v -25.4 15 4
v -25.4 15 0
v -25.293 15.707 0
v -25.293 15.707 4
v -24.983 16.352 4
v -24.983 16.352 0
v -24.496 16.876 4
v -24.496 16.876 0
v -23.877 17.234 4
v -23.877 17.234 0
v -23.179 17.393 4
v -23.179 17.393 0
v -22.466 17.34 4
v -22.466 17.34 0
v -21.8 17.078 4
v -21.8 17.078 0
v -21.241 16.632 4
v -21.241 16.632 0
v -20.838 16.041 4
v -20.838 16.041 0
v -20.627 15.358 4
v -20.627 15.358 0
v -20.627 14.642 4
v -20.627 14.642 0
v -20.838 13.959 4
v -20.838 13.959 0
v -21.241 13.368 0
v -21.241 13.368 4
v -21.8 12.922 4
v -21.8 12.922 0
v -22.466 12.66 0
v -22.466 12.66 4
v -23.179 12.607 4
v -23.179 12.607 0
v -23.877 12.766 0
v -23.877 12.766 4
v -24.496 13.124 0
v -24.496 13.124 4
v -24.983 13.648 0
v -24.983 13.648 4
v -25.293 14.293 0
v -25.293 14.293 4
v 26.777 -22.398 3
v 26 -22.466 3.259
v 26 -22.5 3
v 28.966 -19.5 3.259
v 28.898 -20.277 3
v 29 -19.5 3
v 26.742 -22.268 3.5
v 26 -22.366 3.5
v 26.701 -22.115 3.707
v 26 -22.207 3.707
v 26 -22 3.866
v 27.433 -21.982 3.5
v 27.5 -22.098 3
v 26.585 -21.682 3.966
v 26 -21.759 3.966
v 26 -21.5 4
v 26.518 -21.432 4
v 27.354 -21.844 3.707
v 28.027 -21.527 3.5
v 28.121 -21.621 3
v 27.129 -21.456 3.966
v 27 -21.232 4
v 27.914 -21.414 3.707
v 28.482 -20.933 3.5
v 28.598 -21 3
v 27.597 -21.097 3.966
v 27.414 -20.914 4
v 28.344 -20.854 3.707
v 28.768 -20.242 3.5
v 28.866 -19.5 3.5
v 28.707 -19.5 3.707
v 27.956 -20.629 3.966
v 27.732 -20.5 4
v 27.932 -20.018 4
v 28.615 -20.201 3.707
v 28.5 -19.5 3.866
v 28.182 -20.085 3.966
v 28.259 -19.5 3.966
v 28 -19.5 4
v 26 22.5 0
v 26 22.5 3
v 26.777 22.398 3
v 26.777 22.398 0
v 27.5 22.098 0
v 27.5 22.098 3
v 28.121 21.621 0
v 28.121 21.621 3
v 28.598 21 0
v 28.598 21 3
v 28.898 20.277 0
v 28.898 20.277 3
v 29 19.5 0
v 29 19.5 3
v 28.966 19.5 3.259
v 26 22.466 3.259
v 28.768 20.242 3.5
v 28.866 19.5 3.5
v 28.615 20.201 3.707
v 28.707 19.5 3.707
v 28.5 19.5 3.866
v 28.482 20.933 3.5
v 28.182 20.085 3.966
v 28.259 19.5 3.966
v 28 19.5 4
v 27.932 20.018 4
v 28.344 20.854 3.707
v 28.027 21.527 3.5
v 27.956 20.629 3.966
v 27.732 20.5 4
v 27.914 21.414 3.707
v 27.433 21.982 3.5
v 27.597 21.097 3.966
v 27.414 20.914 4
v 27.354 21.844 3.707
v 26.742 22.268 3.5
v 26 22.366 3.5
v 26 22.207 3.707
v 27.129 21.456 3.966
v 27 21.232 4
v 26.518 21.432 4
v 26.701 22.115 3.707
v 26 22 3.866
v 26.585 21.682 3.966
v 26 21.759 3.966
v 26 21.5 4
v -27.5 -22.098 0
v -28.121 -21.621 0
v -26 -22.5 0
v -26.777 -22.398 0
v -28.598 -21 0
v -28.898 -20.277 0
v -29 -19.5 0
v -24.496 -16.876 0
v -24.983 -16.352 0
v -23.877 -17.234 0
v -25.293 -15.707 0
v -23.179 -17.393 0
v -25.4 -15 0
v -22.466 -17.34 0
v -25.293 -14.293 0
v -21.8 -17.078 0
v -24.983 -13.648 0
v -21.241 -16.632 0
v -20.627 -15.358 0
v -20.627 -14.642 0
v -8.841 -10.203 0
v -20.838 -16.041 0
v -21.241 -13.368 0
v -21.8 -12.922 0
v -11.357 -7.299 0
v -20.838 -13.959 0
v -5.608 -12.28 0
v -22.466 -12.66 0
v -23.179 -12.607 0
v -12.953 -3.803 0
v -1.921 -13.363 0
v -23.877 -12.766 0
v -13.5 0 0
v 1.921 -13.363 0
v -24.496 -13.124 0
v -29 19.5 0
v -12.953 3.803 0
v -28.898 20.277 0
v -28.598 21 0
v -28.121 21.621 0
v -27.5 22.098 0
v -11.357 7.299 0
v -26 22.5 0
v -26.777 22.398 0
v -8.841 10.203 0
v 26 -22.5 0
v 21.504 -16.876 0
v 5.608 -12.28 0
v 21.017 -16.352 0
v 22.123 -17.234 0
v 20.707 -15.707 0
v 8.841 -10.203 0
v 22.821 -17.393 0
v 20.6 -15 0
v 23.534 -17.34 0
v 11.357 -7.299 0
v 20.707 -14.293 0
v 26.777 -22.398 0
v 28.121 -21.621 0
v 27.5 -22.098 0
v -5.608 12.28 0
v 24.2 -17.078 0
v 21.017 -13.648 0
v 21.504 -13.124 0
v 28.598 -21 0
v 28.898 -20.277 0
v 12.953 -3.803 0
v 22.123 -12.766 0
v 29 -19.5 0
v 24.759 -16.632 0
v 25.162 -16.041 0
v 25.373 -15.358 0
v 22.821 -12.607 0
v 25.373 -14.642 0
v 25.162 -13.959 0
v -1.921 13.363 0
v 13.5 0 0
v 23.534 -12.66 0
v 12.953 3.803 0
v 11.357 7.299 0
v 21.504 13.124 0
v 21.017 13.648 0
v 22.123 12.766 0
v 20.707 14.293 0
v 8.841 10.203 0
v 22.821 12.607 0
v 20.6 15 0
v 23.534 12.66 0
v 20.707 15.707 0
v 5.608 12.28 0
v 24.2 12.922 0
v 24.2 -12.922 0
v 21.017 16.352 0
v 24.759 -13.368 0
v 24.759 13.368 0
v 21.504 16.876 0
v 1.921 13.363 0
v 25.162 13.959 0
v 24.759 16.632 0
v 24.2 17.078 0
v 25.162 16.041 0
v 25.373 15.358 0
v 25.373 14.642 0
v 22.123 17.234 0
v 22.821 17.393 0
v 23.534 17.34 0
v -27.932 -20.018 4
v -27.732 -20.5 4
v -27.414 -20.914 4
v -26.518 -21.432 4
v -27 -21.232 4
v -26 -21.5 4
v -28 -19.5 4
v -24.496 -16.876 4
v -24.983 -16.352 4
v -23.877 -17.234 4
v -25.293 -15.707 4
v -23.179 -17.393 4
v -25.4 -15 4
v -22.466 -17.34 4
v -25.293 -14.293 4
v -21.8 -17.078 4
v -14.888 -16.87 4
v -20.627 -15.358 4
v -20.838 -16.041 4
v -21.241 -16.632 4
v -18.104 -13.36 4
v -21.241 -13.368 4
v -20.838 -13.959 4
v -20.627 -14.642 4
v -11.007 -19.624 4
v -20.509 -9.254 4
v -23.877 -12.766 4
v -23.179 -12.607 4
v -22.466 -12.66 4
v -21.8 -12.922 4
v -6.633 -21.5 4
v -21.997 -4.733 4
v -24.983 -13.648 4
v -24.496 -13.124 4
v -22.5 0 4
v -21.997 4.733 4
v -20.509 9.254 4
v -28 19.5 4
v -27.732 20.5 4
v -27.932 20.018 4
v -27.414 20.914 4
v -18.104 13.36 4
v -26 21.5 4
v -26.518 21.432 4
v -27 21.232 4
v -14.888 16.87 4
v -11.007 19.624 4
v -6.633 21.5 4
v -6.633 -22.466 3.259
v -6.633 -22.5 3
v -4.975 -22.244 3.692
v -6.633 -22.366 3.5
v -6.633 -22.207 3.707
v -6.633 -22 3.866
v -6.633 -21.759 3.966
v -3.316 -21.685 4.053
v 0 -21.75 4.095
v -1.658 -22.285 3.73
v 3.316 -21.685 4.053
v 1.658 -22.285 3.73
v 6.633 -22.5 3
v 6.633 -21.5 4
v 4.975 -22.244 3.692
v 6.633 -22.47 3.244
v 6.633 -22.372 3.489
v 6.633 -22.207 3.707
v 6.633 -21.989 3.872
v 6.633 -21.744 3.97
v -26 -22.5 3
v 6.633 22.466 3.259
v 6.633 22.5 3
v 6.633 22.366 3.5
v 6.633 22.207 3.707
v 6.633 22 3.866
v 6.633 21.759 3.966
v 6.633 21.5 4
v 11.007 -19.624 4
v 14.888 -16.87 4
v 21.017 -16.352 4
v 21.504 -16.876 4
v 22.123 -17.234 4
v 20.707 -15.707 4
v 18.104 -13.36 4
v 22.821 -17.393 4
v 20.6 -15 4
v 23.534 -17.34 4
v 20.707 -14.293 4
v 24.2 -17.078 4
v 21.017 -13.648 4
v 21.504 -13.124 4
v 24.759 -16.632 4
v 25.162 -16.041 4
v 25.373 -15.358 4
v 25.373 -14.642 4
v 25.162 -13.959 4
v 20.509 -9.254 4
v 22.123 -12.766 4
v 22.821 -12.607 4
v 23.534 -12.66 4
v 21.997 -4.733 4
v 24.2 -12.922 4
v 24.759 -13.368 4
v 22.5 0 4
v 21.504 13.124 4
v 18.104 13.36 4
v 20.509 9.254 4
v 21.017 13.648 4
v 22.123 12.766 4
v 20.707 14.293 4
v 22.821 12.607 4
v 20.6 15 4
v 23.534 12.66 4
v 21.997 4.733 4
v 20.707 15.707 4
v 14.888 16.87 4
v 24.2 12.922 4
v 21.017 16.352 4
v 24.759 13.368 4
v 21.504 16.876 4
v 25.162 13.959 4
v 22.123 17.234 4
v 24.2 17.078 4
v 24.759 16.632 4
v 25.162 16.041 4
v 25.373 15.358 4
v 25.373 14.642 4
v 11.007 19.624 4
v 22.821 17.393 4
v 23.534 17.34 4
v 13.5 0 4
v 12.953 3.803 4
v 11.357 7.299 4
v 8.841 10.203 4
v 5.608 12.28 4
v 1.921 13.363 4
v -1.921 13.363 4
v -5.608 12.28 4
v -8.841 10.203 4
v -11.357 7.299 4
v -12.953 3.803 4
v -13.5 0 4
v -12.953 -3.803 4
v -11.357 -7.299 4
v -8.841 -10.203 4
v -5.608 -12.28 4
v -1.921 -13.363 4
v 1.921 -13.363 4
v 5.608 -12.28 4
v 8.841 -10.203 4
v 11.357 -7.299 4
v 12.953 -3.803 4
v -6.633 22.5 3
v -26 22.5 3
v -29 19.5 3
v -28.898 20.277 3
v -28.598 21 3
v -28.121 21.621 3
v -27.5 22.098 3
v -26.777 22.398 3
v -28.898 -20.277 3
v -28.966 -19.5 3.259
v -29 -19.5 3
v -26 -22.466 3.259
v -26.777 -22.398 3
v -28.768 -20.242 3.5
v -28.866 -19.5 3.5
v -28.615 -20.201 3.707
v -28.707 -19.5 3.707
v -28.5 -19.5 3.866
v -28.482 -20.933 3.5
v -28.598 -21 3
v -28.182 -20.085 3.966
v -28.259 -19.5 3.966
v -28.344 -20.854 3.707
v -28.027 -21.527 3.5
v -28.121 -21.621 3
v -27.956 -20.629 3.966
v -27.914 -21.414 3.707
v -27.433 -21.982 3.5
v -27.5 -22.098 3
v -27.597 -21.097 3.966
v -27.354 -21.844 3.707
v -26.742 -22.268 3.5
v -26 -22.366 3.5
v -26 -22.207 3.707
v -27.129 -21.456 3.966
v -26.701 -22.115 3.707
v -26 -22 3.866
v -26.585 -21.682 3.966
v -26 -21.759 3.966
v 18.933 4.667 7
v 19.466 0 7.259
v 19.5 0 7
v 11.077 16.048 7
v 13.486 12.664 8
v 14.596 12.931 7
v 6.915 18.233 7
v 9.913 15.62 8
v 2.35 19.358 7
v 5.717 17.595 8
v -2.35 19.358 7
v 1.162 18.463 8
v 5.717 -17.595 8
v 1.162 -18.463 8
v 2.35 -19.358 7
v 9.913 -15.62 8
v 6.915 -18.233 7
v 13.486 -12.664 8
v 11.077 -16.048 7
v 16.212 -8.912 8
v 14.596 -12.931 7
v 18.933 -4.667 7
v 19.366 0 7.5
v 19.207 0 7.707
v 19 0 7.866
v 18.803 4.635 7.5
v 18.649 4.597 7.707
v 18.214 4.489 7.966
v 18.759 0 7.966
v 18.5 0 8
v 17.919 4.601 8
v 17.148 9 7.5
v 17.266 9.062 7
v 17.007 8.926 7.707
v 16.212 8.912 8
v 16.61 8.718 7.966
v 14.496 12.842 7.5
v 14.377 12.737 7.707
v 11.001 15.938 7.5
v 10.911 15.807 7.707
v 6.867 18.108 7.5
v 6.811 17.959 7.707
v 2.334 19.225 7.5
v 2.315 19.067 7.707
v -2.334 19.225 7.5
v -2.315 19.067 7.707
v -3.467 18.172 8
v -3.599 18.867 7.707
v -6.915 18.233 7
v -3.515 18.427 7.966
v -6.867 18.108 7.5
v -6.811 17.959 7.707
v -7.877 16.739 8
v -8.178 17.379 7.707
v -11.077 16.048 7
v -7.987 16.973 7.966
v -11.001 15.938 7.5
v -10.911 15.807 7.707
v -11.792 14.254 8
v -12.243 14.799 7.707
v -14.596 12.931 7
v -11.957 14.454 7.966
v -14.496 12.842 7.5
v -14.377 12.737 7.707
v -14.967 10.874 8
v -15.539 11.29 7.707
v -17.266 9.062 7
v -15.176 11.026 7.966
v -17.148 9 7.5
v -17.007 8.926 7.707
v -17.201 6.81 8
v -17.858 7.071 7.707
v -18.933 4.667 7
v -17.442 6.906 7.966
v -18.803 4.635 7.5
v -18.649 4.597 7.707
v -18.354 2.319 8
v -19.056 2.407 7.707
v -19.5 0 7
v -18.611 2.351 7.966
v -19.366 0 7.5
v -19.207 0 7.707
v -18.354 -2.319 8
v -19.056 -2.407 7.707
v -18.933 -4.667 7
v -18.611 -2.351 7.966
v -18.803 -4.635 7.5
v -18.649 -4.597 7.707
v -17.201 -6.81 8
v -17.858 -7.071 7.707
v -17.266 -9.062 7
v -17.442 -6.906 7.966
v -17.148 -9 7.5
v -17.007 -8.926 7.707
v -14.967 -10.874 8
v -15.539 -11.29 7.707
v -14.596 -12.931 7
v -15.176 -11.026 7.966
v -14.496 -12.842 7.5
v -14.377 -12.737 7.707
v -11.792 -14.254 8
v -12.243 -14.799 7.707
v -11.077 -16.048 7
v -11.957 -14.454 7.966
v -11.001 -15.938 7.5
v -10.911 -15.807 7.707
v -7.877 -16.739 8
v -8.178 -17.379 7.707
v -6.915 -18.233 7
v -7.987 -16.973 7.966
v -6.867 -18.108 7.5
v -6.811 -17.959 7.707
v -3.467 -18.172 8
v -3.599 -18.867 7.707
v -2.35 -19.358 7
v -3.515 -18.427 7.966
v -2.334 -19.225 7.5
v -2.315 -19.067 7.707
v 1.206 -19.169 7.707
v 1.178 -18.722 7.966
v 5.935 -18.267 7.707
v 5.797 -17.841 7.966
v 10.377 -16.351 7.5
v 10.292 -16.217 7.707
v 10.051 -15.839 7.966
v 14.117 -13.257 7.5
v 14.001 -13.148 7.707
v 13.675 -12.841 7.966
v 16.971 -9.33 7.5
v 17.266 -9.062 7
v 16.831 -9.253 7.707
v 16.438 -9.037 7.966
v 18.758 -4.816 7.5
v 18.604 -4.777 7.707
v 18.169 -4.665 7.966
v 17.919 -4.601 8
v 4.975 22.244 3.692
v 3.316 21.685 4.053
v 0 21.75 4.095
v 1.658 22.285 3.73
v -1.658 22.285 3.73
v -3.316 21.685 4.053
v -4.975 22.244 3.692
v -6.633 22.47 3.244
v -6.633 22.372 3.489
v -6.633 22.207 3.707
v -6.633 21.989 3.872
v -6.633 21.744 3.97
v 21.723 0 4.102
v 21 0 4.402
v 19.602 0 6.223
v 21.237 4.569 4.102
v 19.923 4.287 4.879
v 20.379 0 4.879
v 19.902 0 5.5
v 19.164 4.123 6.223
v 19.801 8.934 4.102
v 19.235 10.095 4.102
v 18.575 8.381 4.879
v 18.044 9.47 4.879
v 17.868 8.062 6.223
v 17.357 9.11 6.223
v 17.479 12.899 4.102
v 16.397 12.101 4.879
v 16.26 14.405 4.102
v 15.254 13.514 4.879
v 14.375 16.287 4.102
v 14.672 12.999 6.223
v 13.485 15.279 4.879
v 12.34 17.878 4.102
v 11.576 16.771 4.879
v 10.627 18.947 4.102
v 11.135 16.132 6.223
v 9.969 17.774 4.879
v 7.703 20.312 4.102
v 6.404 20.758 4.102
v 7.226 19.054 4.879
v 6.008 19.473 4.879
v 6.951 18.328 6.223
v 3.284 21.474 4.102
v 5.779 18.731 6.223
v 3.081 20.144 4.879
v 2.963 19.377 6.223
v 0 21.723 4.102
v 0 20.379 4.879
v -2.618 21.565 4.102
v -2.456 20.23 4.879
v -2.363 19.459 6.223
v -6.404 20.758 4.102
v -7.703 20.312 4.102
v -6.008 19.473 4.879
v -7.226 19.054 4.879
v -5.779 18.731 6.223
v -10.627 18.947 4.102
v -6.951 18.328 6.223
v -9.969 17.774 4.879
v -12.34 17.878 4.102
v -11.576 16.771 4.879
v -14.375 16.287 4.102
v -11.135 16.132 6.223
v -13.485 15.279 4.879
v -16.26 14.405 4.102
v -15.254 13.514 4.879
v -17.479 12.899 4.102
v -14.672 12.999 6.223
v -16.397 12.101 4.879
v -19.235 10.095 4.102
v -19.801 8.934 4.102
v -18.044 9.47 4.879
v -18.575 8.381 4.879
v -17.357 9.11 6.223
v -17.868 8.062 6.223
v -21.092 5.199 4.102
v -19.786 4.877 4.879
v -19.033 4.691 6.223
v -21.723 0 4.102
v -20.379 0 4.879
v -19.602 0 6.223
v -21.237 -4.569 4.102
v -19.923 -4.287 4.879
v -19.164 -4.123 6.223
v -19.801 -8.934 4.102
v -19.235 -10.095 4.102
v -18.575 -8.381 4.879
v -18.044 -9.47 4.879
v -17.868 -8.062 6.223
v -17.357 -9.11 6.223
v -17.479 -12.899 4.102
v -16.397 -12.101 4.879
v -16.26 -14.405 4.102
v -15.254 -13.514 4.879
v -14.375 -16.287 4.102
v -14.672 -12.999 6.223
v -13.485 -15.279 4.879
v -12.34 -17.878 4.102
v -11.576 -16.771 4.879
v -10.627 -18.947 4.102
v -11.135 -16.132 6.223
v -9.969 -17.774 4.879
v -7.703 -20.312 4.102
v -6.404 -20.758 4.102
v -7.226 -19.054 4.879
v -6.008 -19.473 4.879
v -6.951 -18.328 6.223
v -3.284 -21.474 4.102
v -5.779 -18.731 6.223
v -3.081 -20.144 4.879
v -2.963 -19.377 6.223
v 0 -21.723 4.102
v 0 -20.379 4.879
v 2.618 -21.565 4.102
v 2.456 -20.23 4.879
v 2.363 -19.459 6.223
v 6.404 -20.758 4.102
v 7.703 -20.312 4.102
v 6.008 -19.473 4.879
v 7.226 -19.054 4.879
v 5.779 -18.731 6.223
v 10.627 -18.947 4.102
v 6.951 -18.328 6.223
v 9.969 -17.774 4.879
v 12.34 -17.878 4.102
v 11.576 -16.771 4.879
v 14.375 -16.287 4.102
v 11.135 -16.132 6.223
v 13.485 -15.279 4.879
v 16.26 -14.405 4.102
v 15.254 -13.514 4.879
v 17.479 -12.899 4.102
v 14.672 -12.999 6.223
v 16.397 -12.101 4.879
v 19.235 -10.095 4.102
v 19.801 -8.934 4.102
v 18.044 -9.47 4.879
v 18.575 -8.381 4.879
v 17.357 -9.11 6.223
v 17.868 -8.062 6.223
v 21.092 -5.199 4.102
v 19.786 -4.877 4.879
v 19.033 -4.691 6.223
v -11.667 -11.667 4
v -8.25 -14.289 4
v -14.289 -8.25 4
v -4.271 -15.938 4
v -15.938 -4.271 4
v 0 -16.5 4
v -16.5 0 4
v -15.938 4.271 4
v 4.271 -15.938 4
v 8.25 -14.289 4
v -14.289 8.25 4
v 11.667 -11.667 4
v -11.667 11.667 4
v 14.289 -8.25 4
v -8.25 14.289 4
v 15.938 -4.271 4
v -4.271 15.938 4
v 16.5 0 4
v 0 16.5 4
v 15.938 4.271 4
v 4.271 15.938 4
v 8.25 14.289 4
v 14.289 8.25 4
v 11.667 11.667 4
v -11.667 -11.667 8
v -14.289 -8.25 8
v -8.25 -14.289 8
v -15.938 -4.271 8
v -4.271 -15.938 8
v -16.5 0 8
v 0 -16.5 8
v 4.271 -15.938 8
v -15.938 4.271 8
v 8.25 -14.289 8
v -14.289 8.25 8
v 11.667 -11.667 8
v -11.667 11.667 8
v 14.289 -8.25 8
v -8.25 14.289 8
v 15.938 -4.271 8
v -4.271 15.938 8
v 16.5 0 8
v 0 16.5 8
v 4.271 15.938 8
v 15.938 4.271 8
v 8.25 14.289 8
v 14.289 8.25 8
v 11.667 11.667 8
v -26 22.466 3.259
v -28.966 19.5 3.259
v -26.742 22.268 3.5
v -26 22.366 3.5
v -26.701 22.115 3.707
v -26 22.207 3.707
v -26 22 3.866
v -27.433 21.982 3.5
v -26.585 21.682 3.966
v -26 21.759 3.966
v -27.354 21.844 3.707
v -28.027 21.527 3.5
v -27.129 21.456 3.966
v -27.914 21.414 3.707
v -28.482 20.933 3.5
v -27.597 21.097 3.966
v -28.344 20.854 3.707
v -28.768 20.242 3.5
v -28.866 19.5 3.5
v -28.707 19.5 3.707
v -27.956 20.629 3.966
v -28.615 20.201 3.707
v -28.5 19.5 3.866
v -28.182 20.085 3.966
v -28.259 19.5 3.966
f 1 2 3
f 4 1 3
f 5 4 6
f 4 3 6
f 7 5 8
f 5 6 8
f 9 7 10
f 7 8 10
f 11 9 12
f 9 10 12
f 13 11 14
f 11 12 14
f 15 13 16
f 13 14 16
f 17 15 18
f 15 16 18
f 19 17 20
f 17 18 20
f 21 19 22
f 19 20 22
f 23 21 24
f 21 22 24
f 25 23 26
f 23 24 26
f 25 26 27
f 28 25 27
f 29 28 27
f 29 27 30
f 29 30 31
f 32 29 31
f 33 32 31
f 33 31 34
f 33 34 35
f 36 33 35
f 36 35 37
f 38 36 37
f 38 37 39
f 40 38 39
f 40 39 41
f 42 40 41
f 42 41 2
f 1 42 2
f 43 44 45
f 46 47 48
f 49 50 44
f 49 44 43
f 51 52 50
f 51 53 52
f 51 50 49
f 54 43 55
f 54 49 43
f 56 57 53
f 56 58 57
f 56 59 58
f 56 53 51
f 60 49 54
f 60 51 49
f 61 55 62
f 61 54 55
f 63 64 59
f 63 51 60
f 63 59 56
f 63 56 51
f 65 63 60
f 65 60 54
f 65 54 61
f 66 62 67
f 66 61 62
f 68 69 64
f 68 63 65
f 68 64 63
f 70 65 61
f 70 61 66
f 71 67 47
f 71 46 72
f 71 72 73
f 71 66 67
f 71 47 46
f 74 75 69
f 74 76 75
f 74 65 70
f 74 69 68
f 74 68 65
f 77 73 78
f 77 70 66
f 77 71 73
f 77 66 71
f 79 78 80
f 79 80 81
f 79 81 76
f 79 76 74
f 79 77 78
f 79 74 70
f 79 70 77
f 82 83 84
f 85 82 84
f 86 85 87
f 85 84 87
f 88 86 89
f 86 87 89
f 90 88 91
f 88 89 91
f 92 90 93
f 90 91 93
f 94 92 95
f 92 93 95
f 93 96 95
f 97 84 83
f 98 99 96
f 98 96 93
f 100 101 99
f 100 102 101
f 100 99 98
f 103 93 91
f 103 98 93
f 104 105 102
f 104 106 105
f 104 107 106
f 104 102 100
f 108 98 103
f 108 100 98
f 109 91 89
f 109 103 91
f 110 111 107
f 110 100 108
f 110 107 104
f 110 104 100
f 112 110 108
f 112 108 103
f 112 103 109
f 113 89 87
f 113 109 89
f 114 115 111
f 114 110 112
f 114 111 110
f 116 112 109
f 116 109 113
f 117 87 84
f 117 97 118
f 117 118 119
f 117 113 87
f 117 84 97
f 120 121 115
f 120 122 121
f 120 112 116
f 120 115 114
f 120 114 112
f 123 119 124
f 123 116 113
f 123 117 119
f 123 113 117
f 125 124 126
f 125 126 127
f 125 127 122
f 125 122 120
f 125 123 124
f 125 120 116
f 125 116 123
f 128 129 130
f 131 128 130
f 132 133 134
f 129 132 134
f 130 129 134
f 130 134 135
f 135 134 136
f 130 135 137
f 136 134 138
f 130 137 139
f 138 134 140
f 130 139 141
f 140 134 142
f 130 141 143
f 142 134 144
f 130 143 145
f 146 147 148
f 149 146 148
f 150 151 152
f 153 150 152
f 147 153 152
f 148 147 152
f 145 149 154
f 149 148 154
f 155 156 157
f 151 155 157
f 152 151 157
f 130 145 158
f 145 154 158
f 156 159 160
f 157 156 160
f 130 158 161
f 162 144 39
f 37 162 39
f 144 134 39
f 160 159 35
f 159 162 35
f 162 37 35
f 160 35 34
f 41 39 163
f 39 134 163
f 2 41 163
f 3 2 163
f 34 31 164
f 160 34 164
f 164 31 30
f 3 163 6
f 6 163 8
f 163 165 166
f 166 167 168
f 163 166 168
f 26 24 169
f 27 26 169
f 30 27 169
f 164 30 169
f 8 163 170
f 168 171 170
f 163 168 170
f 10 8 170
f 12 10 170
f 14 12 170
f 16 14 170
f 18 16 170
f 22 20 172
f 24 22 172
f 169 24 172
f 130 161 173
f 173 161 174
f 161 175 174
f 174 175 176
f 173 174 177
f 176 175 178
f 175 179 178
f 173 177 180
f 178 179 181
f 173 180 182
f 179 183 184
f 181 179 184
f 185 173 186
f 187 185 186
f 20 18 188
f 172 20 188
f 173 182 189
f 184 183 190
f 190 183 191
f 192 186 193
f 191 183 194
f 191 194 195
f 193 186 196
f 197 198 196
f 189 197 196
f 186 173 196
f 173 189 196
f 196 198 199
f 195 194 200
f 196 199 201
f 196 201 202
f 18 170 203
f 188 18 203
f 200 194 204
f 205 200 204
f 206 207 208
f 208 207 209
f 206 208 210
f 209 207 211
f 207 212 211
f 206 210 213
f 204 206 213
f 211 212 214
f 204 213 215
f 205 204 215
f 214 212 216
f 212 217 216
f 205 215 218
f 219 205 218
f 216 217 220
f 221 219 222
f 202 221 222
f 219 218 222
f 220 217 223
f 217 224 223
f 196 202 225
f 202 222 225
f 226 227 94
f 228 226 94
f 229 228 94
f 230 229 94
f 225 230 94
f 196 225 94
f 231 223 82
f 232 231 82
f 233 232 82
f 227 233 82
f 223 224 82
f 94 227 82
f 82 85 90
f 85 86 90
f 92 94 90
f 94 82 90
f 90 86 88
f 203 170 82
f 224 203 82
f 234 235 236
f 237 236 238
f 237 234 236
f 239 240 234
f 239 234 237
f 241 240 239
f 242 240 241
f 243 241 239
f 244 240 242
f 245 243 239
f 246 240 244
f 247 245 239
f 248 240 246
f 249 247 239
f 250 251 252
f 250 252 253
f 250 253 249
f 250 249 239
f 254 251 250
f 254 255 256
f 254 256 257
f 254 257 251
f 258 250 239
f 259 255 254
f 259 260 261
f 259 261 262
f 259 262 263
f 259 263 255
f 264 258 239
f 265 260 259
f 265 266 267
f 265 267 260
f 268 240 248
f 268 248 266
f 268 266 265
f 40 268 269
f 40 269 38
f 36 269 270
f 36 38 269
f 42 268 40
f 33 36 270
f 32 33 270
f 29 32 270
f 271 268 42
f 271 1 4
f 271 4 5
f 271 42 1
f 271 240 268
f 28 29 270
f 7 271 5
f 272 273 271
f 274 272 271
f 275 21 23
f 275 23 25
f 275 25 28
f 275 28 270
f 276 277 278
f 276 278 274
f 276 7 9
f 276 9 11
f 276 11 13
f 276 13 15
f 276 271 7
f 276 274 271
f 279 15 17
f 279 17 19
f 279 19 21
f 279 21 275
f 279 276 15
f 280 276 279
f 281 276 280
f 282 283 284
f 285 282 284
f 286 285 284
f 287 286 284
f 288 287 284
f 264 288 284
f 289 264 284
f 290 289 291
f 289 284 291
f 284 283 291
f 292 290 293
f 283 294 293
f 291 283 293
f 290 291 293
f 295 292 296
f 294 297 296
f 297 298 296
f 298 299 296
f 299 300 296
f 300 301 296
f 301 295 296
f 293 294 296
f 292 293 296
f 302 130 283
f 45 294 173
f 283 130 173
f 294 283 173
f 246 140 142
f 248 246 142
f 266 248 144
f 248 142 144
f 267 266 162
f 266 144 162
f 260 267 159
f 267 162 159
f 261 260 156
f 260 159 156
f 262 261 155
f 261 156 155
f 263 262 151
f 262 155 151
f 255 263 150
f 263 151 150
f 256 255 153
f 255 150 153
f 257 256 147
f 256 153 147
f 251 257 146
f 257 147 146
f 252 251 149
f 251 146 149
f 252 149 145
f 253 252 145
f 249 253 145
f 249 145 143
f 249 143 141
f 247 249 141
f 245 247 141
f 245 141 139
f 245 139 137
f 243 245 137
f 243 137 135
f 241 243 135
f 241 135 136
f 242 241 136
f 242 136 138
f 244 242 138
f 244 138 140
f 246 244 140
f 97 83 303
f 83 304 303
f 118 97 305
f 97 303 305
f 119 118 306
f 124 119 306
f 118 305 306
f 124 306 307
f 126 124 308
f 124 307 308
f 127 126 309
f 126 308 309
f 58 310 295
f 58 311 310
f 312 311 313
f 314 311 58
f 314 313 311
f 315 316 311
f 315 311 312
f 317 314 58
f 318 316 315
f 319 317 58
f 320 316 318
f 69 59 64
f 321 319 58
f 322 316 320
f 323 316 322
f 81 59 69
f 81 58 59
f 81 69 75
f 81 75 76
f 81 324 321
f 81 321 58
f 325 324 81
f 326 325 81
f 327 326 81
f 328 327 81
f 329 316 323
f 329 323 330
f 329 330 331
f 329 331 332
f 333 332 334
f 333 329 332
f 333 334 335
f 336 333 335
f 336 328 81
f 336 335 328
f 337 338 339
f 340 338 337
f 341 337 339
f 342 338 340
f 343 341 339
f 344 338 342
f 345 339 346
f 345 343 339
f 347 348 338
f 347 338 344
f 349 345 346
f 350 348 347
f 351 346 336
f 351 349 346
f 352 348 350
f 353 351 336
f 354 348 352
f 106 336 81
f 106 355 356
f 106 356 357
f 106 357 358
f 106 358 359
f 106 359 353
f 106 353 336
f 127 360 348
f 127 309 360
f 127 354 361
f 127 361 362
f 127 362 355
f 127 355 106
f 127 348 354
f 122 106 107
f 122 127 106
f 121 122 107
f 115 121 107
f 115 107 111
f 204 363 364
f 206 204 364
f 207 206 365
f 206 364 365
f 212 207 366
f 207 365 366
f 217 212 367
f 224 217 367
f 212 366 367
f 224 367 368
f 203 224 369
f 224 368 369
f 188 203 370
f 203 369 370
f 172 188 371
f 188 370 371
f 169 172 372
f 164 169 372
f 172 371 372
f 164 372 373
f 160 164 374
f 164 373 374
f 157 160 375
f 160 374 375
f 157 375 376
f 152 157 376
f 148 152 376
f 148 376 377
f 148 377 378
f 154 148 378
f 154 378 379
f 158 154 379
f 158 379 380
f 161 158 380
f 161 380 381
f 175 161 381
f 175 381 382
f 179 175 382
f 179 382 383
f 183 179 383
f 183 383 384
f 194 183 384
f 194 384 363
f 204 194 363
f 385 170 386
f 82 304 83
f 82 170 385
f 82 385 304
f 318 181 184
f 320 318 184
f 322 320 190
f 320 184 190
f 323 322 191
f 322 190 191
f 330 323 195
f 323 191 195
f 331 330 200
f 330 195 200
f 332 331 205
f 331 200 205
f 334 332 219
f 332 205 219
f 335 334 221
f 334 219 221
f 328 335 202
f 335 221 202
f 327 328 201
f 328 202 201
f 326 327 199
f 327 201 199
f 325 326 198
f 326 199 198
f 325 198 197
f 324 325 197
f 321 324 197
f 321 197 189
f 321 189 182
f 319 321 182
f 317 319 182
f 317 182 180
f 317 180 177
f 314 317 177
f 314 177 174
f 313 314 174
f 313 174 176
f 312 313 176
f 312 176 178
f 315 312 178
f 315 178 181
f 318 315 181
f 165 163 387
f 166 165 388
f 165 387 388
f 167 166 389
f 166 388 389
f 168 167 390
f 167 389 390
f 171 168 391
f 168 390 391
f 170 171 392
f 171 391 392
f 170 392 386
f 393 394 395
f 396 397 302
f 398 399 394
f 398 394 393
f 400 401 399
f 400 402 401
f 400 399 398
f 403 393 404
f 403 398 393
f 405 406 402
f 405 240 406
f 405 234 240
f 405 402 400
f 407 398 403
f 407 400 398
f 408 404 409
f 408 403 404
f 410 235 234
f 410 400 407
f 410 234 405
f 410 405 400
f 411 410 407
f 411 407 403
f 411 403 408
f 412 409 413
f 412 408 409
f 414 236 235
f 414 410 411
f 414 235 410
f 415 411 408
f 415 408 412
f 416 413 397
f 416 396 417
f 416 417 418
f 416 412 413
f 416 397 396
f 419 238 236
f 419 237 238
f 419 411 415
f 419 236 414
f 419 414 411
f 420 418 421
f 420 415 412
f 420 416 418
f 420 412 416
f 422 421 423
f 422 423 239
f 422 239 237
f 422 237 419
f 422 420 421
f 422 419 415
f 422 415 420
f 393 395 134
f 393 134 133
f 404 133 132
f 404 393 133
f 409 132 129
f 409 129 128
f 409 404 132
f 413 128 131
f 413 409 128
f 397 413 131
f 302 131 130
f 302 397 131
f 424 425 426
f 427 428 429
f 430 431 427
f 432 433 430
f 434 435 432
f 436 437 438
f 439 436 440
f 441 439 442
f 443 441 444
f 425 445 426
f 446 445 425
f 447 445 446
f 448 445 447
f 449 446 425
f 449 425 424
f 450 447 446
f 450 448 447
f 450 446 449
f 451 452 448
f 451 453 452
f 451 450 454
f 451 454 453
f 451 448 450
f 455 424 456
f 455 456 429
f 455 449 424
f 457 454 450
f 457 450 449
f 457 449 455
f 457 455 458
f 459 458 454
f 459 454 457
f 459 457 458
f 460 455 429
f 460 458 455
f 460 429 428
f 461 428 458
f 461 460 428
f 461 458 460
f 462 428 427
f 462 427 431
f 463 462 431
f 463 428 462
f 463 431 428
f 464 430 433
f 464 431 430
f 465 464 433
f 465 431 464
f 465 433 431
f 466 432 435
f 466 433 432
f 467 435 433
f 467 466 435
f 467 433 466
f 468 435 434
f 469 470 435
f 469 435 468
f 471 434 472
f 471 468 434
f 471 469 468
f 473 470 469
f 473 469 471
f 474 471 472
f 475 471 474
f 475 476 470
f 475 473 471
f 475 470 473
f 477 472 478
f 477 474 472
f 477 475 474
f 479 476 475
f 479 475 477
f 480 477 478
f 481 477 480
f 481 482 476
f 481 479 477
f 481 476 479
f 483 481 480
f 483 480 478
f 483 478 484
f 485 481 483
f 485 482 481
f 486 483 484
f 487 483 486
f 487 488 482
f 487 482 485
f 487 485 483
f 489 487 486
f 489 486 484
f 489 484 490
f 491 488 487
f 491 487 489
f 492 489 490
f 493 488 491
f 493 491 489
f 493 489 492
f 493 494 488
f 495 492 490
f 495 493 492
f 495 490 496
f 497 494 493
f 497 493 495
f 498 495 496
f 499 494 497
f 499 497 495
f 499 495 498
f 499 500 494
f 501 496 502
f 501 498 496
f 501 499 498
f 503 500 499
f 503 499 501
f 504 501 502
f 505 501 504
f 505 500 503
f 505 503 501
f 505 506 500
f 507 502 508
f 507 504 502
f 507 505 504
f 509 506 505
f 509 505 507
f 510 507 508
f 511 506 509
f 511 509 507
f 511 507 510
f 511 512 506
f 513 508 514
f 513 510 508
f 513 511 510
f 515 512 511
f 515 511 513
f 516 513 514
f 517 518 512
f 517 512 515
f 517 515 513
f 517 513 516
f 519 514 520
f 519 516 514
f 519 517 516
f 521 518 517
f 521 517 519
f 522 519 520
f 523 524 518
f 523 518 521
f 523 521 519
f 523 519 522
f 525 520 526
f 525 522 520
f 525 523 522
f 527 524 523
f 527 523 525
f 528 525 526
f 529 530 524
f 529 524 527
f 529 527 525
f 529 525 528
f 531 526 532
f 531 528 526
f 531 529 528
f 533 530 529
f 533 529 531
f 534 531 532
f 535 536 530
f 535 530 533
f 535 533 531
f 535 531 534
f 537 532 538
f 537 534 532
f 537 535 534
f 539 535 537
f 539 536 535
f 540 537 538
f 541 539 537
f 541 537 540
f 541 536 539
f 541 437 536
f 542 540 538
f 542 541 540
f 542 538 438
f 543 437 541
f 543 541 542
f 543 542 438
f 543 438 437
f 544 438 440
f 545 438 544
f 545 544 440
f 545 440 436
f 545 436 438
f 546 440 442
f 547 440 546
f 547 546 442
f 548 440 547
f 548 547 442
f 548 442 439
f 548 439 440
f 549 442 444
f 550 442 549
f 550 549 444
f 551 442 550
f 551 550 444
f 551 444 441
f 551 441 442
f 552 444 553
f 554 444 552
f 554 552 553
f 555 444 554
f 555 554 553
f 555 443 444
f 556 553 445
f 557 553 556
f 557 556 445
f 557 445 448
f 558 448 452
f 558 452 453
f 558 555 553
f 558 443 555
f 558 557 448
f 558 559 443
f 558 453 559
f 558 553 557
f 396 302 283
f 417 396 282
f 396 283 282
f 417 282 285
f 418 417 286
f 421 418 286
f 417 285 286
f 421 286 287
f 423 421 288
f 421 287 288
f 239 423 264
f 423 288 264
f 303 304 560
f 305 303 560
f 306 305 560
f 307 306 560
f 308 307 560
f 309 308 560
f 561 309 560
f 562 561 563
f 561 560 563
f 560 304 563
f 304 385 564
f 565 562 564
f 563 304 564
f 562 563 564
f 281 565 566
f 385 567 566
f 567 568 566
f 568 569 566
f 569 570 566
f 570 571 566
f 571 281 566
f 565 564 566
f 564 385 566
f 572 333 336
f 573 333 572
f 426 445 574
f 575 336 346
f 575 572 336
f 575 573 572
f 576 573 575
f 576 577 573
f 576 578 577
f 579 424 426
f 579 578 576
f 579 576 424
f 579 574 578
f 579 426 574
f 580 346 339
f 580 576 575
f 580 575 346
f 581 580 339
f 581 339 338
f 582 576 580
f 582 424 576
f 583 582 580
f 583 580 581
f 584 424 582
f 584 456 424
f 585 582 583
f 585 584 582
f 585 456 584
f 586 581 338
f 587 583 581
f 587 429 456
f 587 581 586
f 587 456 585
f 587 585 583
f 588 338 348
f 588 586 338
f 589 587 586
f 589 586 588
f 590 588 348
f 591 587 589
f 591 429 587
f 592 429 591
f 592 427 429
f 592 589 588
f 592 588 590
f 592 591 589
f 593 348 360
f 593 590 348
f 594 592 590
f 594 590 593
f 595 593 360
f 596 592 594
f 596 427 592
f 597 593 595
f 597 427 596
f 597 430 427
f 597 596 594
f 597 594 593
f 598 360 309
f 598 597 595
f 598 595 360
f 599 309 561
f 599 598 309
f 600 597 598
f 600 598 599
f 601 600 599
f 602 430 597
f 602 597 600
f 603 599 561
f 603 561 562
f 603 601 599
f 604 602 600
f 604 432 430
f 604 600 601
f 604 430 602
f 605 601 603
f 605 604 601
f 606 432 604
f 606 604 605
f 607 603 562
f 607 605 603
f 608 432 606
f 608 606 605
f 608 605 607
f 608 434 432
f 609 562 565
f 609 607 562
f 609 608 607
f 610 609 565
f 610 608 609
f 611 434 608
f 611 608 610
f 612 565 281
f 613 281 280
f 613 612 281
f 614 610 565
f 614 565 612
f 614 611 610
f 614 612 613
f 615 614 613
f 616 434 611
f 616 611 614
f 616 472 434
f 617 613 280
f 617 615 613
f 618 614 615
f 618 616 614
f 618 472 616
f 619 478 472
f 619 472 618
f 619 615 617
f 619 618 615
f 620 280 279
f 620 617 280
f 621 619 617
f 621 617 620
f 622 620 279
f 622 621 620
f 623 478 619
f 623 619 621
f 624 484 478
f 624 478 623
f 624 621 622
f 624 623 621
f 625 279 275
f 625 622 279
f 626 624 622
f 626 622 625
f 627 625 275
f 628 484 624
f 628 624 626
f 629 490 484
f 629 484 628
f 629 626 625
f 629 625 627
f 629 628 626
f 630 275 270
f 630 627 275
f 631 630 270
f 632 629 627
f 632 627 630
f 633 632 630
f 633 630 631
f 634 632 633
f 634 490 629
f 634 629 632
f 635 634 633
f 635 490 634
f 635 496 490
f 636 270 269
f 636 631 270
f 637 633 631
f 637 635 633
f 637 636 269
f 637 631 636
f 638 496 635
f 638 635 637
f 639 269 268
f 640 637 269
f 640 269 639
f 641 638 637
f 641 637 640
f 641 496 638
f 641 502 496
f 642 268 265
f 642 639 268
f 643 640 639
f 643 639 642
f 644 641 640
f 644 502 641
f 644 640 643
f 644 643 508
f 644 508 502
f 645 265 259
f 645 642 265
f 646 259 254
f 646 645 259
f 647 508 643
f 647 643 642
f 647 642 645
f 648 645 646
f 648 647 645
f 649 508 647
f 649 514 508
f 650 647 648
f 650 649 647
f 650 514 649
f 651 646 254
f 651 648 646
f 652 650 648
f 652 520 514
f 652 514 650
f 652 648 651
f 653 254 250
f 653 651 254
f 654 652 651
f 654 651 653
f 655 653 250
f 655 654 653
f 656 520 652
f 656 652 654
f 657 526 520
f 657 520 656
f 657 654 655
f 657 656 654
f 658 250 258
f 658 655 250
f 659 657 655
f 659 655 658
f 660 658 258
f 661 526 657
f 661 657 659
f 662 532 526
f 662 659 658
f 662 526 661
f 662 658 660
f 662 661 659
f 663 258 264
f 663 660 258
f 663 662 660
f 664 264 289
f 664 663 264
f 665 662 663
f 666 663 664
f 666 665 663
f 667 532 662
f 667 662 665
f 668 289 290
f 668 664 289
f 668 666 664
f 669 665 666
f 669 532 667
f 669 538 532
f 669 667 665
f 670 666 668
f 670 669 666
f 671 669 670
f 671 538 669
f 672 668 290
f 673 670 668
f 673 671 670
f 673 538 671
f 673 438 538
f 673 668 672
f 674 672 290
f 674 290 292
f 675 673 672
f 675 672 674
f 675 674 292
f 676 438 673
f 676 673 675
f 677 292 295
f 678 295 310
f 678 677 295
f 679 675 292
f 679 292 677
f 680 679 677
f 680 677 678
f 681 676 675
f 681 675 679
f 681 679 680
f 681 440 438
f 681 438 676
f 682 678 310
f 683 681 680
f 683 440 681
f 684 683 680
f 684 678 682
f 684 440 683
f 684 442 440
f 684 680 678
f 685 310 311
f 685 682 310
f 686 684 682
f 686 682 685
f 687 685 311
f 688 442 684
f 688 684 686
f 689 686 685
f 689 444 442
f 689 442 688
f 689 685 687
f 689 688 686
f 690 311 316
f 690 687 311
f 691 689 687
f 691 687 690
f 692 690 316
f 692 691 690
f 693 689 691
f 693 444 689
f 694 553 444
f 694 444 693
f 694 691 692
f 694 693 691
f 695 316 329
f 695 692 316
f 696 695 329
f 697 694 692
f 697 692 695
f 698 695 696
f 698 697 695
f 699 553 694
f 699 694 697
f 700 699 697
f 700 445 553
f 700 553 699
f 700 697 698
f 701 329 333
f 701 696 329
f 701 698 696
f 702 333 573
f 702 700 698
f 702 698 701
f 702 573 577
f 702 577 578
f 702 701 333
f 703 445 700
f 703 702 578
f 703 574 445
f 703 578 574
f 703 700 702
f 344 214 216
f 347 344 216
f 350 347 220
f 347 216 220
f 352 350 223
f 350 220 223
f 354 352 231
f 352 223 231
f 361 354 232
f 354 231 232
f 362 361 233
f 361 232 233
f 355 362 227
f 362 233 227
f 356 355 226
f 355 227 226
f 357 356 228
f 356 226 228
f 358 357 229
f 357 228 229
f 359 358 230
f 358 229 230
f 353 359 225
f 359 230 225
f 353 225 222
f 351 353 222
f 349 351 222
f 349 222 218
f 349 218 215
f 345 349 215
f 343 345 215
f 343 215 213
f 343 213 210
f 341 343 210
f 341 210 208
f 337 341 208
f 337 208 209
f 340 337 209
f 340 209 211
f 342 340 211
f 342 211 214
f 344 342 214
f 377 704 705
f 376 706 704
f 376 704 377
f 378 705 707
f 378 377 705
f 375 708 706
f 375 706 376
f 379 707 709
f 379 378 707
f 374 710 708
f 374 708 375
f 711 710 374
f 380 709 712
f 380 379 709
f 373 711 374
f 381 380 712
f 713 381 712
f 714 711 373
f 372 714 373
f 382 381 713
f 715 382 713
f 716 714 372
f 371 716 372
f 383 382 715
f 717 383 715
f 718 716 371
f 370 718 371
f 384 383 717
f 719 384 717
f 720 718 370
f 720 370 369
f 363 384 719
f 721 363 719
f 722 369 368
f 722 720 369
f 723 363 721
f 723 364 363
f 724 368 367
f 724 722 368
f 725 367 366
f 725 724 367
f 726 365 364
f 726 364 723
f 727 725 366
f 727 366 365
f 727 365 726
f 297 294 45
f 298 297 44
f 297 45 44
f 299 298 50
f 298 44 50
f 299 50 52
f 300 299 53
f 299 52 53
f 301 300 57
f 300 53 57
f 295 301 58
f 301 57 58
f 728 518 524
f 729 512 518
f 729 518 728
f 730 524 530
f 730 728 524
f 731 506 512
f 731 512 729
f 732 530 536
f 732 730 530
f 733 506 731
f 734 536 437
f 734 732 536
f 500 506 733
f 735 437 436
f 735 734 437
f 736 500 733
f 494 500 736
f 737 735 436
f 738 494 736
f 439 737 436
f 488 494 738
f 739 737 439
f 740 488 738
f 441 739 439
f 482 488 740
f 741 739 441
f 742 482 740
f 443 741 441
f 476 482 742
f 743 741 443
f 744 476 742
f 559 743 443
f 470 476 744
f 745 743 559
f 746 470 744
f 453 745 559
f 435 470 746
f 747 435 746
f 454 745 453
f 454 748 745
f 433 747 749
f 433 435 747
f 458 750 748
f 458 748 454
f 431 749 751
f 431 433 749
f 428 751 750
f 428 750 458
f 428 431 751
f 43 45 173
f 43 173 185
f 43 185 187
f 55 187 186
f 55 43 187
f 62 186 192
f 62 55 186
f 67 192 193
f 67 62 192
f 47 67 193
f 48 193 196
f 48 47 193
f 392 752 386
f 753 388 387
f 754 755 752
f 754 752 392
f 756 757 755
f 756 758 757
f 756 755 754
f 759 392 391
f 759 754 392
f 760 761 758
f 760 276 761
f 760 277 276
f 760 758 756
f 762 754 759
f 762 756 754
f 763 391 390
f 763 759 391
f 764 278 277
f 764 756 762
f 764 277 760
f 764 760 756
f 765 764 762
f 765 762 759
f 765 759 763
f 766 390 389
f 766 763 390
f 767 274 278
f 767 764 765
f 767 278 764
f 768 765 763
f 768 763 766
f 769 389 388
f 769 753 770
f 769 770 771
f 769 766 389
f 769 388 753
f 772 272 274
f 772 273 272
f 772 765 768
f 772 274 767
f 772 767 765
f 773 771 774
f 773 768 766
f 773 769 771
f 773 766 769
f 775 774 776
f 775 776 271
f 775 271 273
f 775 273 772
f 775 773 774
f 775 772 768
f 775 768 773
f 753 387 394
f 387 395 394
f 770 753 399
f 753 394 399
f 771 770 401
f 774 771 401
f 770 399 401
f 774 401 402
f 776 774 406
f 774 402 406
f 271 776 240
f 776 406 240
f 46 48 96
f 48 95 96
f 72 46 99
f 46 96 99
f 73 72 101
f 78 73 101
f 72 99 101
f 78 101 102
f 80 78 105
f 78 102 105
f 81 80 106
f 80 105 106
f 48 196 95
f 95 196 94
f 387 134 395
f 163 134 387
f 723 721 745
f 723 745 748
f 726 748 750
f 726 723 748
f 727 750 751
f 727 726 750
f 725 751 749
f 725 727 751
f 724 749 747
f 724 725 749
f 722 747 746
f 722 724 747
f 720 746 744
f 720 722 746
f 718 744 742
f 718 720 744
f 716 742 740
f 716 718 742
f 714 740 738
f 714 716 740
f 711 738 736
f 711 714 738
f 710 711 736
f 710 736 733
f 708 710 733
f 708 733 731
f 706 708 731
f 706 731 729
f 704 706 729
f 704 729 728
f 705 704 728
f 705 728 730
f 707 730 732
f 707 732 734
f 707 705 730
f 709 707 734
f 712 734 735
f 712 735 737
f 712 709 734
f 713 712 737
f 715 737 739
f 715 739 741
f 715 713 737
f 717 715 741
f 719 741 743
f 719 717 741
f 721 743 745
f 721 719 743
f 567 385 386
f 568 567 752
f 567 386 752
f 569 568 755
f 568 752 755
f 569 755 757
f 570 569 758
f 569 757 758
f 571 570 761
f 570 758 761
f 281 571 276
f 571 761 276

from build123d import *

# Parameters (mm, degrees)
SKETCH1_W            = 58
SKETCH1_H            = 45
SKETCH1_R            = 2
BOSS_EXTRUDE1_DEPTH  = 4
SKETCH4_R            = 19.5
SKETCH4_R_2          = 16.5
BOSS_EXTRUDE3_DEPTH  = 4
SKETCH5_R            = 13.5
CUT_EXTRUDE2_DEPTH   = 37.922215535
M4_CLEARANCE_HOLE1_D = 4.8
FILLET1_R            = 3
FILLET2_R            = 1


with BuildPart() as part:
    # Sketch1 → Boss-Extrude1 (new body)
    # profile 1 of 5: a face of its own
    with BuildSketch(Plane.XY):
        Rectangle(SKETCH1_W, SKETCH1_H)
        with Locations((23, 15)):
            Circle(SKETCH1_R, mode=Mode.SUBTRACT)
        with Locations((23, -15)):
            Circle(SKETCH1_R, mode=Mode.SUBTRACT)
        with Locations((-23, -15)):
            Circle(SKETCH1_R, mode=Mode.SUBTRACT)
        with Locations((-23, 15)):
            Circle(SKETCH1_R, mode=Mode.SUBTRACT)
    # profile 2 of 5: a face of its own
    with BuildSketch(Plane.XY):
        with Locations((-23, 15)):
            Circle(SKETCH1_R)
    # profile 3 of 5: a face of its own
    with BuildSketch(Plane.XY):
        with Locations((-23, -15)):
            Circle(SKETCH1_R)
    # profile 4 of 5: a face of its own
    with BuildSketch(Plane.XY):
        with Locations((23, -15)):
            Circle(SKETCH1_R)
    # profile 5 of 5: a face of its own
    with BuildSketch(Plane.XY):
        with Locations((23, 15)):
            Circle(SKETCH1_R)
    extrude(amount=BOSS_EXTRUDE1_DEPTH)

    # Sketch4 → Boss-Extrude3 (add)
    with BuildSketch(Plane.XY.offset(4)):
        Circle(SKETCH4_R)
        Circle(SKETCH4_R_2, mode=Mode.SUBTRACT)
    extrude(amount=BOSS_EXTRUDE3_DEPTH)

    # Sketch5 → Cut-Extrude2 (cut, through all)
    with BuildSketch(Plane.XY.offset(4)):
        Circle(SKETCH5_R)
    extrude(amount=-CUT_EXTRUDE2_DEPTH, mode=Mode.SUBTRACT)

    # M4 Clearance Hole1 (through all)
    with Locations(Plane.XY.offset(4)):
        with Locations((23, 15), (23, -15), (-23, -15), (-23, 15)):
            Hole(M4_CLEARANCE_HOLE1_D / 2)

    # Fillet1
    fillet1_edges = [part.edges().sort_by_distance(p)[0] for p in [
        (-19.5, 0, 4),
        (29, -22.5, 2),
        (-29, -22.5, 2),
        (-29, 22.5, 2),
        (29, 22.5, 2),
    ]]
    fillet(fillet1_edges, radius=FILLET1_R - 0.0001)  # a hair under: the kernel refuses the full size

    # Fillet2
    fillet2_edges = [part.edges().sort_by_distance(p)[0] for p in [
        (-19.5, 0, 8),
        (0, -22.5, 4),
        (0, -22.5, 4),
        (-29, 0, 4),
        (29, 0, 4),
        (0, 22.5, 4),
        (0, 22.5, 4),
        (28.121349633, 21.621349633, 4),
        (28.121349633, -21.621349633, 4),
        (-28.121349633, 21.621349633, 4),
        (-28.121349633, -21.621349633, 4),
    ]]
    fillet(fillet2_edges, radius=FILLET2_R)


solid = part.part
